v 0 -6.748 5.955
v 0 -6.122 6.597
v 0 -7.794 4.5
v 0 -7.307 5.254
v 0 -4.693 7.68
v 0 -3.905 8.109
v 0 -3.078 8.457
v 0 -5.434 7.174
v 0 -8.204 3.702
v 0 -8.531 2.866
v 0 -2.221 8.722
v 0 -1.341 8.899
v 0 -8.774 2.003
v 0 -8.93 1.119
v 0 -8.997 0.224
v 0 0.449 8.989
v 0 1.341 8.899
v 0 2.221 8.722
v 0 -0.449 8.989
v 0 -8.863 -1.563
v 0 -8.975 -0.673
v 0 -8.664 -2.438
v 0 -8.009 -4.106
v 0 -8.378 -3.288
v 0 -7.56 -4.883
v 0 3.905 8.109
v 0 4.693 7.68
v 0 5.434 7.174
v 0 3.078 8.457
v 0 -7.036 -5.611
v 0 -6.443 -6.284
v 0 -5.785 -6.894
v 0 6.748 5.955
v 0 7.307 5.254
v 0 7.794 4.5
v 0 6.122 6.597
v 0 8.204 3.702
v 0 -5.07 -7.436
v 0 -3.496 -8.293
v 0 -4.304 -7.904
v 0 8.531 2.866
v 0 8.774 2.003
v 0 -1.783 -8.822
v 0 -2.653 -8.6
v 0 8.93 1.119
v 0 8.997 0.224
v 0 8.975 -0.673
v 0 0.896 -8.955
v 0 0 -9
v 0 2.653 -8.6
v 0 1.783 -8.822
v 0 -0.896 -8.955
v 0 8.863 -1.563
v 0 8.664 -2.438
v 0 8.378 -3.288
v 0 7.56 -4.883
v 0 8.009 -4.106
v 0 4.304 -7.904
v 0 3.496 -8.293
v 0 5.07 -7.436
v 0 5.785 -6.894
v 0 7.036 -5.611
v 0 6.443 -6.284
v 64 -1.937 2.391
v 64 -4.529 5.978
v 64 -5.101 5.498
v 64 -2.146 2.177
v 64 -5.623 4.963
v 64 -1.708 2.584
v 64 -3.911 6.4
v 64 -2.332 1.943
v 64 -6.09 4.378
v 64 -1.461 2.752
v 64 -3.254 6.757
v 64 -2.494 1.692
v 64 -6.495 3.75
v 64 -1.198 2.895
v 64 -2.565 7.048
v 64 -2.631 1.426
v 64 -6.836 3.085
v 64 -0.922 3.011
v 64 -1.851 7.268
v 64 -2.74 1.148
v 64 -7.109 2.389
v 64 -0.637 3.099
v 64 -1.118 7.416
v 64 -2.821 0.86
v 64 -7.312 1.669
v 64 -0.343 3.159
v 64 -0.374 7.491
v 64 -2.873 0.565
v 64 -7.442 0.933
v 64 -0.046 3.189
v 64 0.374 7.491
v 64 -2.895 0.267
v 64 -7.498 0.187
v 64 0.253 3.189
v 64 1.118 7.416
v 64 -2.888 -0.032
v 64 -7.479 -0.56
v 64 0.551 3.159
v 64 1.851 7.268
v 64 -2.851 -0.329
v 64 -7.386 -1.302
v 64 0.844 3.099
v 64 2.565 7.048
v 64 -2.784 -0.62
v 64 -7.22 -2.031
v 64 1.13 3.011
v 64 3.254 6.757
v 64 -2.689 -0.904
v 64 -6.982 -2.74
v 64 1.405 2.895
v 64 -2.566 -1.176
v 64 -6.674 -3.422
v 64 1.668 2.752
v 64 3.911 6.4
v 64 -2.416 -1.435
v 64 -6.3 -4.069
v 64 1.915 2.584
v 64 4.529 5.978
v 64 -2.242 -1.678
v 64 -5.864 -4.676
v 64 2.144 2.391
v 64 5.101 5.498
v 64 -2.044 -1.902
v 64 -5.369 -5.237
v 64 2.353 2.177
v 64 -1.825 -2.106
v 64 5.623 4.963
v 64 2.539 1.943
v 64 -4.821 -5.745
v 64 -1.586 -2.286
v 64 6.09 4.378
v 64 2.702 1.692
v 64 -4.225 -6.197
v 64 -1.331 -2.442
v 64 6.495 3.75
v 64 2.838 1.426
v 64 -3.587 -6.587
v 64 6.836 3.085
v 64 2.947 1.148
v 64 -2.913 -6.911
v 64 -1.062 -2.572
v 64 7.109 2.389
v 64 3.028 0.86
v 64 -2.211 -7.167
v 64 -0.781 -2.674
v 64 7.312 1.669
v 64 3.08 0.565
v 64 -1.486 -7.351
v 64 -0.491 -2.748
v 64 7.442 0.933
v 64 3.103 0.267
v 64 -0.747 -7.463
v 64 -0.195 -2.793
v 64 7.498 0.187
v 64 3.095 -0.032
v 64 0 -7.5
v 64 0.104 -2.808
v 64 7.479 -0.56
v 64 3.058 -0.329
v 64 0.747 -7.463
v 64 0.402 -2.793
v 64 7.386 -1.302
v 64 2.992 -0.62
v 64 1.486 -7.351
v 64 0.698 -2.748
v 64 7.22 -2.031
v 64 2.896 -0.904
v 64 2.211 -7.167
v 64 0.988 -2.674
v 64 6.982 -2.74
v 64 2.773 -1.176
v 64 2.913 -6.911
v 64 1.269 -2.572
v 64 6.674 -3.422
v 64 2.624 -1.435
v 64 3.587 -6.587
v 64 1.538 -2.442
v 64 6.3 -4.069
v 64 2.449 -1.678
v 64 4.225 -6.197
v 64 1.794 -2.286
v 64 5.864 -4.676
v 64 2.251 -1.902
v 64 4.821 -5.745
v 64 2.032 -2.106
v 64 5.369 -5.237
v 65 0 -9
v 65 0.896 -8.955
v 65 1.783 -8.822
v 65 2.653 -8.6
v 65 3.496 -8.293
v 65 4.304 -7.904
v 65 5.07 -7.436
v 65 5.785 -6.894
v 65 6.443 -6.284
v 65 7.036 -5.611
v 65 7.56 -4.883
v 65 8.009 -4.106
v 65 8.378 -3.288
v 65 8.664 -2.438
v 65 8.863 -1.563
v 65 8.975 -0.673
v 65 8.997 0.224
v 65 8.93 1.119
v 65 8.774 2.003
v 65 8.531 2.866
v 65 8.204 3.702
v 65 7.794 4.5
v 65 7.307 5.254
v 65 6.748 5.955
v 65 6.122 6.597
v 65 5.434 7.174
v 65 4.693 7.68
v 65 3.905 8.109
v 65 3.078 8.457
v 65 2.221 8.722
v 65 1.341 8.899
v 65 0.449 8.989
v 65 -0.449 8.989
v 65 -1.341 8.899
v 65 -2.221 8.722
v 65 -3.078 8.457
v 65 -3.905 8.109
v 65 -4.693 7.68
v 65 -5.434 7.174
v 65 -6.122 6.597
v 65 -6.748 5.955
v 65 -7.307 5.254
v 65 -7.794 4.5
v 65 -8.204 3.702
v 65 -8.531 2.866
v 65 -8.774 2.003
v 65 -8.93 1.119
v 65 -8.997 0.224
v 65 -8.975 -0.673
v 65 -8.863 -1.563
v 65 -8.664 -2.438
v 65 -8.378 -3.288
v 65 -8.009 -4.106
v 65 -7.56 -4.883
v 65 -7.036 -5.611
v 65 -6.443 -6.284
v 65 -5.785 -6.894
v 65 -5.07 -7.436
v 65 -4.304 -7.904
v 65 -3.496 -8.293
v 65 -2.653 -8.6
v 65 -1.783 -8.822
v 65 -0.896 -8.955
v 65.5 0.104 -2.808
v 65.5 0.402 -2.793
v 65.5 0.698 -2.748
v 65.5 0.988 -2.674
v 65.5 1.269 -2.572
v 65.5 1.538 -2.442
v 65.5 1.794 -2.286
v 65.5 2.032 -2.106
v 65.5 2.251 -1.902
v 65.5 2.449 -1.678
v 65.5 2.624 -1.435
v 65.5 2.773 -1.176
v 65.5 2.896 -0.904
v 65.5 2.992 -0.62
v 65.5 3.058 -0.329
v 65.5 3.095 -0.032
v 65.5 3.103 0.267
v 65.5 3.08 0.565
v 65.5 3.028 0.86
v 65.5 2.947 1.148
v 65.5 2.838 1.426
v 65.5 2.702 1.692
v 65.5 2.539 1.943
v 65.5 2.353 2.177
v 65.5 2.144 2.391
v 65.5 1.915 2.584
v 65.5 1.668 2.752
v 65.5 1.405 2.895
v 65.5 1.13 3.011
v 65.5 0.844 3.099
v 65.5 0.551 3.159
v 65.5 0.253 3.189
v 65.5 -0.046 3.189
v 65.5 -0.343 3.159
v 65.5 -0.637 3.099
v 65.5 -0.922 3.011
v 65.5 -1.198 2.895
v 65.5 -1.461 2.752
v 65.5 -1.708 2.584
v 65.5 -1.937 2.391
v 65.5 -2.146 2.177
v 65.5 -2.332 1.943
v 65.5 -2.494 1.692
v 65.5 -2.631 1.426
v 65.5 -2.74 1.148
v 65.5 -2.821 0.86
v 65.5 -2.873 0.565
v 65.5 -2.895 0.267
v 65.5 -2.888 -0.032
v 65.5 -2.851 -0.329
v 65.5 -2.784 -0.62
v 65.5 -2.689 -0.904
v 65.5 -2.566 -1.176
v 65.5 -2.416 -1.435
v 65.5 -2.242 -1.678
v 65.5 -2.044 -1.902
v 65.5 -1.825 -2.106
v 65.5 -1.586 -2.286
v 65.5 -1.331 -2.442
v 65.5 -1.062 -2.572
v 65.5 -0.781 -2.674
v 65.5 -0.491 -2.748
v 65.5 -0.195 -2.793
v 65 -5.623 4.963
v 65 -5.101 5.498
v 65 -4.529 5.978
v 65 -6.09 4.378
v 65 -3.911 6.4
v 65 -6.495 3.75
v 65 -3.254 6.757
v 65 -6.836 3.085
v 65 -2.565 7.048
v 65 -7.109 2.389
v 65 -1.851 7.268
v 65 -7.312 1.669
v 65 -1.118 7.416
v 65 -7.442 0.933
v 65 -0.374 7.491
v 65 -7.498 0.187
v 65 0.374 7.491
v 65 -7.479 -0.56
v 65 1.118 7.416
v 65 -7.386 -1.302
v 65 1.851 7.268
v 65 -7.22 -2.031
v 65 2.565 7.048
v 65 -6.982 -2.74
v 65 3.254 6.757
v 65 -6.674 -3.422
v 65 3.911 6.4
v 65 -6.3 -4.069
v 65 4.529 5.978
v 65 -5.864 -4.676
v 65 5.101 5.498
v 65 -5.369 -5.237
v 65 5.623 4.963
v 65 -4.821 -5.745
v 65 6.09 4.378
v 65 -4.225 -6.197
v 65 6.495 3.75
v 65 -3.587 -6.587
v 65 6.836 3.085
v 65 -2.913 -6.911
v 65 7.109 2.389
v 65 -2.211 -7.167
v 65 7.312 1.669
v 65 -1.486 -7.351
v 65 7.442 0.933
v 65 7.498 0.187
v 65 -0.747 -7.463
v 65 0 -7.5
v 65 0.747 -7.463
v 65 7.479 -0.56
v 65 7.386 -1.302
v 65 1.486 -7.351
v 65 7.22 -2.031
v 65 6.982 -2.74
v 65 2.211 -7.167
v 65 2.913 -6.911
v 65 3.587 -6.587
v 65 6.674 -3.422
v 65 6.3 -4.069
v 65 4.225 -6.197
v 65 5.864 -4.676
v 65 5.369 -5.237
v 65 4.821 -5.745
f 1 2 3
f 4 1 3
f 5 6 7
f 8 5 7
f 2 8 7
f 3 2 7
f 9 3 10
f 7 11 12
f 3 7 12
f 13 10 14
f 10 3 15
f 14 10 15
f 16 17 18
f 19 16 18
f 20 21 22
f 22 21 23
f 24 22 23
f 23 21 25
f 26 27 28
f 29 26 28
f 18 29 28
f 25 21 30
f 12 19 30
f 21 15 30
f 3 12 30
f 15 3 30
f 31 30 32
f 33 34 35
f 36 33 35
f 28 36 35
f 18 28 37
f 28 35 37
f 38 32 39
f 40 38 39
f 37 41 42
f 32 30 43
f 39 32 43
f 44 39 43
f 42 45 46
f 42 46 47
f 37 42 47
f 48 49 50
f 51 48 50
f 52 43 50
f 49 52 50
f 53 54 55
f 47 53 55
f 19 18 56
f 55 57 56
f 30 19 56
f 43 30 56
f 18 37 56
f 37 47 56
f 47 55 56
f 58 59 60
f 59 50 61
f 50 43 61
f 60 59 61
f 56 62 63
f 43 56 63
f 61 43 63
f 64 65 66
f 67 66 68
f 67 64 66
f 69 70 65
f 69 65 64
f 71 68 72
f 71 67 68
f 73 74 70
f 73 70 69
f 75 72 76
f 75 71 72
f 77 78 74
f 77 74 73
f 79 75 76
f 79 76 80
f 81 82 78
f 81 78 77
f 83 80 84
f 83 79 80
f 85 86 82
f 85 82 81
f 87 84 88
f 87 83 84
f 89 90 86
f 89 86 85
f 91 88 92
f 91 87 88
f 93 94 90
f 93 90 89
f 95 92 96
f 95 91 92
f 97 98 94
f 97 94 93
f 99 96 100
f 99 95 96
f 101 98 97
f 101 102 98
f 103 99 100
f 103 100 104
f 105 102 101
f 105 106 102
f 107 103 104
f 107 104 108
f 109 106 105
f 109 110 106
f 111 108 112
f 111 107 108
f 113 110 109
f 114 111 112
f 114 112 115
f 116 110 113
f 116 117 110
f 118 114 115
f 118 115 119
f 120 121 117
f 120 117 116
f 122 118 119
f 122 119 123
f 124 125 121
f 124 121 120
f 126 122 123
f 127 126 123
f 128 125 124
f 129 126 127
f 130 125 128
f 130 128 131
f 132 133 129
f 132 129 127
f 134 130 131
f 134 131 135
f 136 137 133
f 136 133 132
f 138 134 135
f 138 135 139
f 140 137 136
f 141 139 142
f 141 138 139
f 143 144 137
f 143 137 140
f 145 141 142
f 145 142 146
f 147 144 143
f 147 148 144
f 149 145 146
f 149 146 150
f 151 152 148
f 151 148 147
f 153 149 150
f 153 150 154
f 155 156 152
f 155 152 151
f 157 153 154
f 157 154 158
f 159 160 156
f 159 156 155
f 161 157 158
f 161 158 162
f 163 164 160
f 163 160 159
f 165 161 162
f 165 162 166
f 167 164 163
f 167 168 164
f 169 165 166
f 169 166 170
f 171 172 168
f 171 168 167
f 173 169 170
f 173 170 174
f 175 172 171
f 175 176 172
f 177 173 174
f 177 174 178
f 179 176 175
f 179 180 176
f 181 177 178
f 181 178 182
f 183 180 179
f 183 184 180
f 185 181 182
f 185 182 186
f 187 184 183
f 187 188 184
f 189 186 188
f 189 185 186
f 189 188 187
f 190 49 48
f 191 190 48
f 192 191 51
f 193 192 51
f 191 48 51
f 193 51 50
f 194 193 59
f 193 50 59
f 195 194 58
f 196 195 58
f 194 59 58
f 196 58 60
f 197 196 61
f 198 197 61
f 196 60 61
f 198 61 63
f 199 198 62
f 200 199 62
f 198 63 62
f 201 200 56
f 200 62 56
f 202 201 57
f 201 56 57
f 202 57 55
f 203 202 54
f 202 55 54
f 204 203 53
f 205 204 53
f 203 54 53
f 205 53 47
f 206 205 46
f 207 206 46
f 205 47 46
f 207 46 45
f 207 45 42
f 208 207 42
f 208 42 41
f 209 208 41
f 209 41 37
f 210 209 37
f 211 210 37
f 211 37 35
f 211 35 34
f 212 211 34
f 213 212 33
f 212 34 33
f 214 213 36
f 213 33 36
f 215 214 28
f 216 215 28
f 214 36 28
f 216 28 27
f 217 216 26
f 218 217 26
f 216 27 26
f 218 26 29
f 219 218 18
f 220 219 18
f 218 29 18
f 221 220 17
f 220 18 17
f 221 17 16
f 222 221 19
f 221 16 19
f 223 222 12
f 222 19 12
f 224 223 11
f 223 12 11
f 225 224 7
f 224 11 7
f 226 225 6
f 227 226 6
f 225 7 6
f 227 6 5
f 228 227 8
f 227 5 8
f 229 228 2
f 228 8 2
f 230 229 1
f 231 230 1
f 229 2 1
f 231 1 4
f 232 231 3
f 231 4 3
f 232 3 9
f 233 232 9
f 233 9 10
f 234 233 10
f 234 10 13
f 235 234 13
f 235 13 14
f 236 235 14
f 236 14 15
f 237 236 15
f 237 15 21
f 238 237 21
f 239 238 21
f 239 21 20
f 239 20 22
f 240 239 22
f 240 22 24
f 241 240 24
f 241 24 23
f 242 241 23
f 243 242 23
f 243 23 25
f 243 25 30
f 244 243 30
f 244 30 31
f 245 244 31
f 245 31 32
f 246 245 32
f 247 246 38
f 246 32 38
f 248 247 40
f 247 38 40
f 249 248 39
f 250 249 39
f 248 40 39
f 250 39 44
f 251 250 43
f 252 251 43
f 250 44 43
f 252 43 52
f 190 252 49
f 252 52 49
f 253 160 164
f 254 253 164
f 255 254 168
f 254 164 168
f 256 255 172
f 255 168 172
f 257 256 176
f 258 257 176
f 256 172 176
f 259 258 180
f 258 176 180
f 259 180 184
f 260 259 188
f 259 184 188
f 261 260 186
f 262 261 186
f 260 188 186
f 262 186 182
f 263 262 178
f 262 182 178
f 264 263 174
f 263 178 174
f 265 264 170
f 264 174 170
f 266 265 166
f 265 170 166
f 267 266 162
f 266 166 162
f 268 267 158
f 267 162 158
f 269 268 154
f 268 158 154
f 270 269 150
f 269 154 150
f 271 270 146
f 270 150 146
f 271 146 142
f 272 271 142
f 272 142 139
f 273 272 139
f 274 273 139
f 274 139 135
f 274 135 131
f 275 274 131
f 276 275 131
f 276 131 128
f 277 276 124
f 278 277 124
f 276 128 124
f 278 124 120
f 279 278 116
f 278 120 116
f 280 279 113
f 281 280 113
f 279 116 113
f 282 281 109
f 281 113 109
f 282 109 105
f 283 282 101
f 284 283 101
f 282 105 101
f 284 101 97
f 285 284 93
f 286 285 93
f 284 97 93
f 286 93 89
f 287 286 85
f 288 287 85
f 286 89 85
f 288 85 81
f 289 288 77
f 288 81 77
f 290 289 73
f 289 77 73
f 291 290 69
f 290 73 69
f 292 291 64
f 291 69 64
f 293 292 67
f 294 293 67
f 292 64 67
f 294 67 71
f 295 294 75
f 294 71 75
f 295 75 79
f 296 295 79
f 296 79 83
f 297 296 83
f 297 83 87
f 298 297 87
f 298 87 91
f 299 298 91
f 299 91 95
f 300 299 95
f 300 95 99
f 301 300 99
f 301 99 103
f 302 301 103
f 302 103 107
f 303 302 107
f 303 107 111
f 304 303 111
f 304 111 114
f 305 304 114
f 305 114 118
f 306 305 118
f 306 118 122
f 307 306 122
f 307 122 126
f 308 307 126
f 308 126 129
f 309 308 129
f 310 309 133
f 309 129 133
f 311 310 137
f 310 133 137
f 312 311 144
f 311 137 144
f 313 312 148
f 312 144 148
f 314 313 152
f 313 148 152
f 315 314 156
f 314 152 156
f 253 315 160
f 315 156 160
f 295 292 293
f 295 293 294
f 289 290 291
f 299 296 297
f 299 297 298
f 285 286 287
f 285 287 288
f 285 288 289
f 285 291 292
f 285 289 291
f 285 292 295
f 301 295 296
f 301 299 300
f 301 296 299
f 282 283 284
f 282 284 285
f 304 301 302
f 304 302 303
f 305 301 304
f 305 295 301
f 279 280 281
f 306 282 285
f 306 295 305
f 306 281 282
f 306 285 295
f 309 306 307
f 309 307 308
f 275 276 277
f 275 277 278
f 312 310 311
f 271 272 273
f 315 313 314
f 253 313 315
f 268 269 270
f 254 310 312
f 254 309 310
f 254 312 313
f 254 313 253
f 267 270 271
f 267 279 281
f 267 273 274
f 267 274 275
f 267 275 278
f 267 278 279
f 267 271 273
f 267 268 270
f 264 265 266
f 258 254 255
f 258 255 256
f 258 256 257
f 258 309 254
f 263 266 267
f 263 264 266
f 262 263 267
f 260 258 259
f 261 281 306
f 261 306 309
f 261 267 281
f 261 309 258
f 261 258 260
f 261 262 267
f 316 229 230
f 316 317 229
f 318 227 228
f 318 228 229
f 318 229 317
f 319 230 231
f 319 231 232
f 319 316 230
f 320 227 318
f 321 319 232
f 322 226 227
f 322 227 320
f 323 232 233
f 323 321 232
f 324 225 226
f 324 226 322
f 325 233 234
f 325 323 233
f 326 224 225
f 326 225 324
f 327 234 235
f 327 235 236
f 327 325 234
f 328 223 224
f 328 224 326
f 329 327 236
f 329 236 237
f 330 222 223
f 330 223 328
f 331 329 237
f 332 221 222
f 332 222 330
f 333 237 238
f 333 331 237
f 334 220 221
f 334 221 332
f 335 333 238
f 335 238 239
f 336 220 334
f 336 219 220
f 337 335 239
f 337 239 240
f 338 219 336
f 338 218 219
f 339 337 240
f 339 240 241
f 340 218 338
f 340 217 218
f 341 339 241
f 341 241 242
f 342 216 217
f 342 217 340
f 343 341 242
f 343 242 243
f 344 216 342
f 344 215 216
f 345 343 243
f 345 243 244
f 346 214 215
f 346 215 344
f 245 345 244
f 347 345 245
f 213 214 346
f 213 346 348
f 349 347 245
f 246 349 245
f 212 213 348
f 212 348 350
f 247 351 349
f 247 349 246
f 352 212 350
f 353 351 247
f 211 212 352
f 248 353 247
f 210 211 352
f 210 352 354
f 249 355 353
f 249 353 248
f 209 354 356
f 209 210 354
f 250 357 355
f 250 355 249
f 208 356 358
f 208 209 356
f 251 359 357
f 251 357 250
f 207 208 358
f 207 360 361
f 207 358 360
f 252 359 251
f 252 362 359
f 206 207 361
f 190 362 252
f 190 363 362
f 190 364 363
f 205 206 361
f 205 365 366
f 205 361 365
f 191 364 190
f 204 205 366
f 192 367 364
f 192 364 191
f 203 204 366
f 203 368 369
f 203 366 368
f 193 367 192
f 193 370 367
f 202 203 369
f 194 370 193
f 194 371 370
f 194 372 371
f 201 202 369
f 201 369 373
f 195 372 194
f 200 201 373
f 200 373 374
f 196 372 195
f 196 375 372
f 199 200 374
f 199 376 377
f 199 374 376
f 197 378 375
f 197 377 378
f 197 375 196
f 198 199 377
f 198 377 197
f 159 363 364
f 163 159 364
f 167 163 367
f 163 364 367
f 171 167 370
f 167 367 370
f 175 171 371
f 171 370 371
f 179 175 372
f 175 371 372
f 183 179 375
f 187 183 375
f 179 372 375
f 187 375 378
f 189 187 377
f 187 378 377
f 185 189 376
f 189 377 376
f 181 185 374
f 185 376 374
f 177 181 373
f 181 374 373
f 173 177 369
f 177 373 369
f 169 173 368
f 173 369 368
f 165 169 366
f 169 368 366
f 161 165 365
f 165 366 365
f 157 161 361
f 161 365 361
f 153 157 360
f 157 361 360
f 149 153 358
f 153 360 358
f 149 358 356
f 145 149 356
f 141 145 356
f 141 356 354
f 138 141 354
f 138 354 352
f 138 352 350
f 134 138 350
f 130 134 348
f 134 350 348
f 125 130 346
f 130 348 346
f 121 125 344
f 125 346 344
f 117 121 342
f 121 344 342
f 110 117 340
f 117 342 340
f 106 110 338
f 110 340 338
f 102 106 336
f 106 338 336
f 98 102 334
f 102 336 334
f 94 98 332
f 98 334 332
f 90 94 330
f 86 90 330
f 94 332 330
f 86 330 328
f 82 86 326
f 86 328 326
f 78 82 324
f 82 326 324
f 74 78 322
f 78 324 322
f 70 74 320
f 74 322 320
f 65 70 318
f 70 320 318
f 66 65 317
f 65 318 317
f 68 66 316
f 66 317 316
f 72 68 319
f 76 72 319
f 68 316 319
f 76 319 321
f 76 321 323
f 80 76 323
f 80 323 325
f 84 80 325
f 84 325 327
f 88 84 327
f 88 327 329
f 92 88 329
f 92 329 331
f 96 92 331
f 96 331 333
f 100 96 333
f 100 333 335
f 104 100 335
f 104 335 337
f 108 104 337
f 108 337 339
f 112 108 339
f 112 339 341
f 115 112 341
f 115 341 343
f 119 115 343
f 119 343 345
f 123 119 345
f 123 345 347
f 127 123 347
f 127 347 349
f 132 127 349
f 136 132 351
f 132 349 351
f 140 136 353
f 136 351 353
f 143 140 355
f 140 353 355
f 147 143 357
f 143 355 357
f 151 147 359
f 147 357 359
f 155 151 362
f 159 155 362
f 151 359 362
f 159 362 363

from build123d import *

# Parameters (mm, degrees)
SKETCH_1_R          = 9
EXTRUDE_1_DEPTH     = 65
SKETCH_2_R          = 7.5
CUT_EXTRUDE_1_DEPTH = 1
SKETCH_3_R          = 3
EXTRUDE_2_DEPTH     = 1.5


with BuildPart() as part:
    # Эскиз1 → Бобышка-Вытянуть1 (new body)
    with BuildSketch(Plane(origin=(0, 0, 0), x_dir=(0, 0, -1), z_dir=(1, 0, 0))):
        Circle(SKETCH_1_R)
    extrude(amount=EXTRUDE_1_DEPTH)

    # Эскиз2 → Вырез-Вытянуть1 (cut)
    with BuildSketch(Plane(origin=(65, 0, 0), x_dir=(0, 0, -1), z_dir=(1, 0, 0))):
        Circle(SKETCH_2_R)
    extrude(amount=-CUT_EXTRUDE_1_DEPTH, mode=Mode.SUBTRACT)

    # Эскиз3 → Бобышка-Вытянуть2 (add)
    with BuildSketch(Plane(origin=(64, 0, 0), x_dir=(0, 0, -1), z_dir=(1, 0, 0))):
        with Locations((-0.192251795, 0.103684868)):
            Circle(SKETCH_3_R)
    extrude(amount=EXTRUDE_2_DEPTH)


solid = part.part
